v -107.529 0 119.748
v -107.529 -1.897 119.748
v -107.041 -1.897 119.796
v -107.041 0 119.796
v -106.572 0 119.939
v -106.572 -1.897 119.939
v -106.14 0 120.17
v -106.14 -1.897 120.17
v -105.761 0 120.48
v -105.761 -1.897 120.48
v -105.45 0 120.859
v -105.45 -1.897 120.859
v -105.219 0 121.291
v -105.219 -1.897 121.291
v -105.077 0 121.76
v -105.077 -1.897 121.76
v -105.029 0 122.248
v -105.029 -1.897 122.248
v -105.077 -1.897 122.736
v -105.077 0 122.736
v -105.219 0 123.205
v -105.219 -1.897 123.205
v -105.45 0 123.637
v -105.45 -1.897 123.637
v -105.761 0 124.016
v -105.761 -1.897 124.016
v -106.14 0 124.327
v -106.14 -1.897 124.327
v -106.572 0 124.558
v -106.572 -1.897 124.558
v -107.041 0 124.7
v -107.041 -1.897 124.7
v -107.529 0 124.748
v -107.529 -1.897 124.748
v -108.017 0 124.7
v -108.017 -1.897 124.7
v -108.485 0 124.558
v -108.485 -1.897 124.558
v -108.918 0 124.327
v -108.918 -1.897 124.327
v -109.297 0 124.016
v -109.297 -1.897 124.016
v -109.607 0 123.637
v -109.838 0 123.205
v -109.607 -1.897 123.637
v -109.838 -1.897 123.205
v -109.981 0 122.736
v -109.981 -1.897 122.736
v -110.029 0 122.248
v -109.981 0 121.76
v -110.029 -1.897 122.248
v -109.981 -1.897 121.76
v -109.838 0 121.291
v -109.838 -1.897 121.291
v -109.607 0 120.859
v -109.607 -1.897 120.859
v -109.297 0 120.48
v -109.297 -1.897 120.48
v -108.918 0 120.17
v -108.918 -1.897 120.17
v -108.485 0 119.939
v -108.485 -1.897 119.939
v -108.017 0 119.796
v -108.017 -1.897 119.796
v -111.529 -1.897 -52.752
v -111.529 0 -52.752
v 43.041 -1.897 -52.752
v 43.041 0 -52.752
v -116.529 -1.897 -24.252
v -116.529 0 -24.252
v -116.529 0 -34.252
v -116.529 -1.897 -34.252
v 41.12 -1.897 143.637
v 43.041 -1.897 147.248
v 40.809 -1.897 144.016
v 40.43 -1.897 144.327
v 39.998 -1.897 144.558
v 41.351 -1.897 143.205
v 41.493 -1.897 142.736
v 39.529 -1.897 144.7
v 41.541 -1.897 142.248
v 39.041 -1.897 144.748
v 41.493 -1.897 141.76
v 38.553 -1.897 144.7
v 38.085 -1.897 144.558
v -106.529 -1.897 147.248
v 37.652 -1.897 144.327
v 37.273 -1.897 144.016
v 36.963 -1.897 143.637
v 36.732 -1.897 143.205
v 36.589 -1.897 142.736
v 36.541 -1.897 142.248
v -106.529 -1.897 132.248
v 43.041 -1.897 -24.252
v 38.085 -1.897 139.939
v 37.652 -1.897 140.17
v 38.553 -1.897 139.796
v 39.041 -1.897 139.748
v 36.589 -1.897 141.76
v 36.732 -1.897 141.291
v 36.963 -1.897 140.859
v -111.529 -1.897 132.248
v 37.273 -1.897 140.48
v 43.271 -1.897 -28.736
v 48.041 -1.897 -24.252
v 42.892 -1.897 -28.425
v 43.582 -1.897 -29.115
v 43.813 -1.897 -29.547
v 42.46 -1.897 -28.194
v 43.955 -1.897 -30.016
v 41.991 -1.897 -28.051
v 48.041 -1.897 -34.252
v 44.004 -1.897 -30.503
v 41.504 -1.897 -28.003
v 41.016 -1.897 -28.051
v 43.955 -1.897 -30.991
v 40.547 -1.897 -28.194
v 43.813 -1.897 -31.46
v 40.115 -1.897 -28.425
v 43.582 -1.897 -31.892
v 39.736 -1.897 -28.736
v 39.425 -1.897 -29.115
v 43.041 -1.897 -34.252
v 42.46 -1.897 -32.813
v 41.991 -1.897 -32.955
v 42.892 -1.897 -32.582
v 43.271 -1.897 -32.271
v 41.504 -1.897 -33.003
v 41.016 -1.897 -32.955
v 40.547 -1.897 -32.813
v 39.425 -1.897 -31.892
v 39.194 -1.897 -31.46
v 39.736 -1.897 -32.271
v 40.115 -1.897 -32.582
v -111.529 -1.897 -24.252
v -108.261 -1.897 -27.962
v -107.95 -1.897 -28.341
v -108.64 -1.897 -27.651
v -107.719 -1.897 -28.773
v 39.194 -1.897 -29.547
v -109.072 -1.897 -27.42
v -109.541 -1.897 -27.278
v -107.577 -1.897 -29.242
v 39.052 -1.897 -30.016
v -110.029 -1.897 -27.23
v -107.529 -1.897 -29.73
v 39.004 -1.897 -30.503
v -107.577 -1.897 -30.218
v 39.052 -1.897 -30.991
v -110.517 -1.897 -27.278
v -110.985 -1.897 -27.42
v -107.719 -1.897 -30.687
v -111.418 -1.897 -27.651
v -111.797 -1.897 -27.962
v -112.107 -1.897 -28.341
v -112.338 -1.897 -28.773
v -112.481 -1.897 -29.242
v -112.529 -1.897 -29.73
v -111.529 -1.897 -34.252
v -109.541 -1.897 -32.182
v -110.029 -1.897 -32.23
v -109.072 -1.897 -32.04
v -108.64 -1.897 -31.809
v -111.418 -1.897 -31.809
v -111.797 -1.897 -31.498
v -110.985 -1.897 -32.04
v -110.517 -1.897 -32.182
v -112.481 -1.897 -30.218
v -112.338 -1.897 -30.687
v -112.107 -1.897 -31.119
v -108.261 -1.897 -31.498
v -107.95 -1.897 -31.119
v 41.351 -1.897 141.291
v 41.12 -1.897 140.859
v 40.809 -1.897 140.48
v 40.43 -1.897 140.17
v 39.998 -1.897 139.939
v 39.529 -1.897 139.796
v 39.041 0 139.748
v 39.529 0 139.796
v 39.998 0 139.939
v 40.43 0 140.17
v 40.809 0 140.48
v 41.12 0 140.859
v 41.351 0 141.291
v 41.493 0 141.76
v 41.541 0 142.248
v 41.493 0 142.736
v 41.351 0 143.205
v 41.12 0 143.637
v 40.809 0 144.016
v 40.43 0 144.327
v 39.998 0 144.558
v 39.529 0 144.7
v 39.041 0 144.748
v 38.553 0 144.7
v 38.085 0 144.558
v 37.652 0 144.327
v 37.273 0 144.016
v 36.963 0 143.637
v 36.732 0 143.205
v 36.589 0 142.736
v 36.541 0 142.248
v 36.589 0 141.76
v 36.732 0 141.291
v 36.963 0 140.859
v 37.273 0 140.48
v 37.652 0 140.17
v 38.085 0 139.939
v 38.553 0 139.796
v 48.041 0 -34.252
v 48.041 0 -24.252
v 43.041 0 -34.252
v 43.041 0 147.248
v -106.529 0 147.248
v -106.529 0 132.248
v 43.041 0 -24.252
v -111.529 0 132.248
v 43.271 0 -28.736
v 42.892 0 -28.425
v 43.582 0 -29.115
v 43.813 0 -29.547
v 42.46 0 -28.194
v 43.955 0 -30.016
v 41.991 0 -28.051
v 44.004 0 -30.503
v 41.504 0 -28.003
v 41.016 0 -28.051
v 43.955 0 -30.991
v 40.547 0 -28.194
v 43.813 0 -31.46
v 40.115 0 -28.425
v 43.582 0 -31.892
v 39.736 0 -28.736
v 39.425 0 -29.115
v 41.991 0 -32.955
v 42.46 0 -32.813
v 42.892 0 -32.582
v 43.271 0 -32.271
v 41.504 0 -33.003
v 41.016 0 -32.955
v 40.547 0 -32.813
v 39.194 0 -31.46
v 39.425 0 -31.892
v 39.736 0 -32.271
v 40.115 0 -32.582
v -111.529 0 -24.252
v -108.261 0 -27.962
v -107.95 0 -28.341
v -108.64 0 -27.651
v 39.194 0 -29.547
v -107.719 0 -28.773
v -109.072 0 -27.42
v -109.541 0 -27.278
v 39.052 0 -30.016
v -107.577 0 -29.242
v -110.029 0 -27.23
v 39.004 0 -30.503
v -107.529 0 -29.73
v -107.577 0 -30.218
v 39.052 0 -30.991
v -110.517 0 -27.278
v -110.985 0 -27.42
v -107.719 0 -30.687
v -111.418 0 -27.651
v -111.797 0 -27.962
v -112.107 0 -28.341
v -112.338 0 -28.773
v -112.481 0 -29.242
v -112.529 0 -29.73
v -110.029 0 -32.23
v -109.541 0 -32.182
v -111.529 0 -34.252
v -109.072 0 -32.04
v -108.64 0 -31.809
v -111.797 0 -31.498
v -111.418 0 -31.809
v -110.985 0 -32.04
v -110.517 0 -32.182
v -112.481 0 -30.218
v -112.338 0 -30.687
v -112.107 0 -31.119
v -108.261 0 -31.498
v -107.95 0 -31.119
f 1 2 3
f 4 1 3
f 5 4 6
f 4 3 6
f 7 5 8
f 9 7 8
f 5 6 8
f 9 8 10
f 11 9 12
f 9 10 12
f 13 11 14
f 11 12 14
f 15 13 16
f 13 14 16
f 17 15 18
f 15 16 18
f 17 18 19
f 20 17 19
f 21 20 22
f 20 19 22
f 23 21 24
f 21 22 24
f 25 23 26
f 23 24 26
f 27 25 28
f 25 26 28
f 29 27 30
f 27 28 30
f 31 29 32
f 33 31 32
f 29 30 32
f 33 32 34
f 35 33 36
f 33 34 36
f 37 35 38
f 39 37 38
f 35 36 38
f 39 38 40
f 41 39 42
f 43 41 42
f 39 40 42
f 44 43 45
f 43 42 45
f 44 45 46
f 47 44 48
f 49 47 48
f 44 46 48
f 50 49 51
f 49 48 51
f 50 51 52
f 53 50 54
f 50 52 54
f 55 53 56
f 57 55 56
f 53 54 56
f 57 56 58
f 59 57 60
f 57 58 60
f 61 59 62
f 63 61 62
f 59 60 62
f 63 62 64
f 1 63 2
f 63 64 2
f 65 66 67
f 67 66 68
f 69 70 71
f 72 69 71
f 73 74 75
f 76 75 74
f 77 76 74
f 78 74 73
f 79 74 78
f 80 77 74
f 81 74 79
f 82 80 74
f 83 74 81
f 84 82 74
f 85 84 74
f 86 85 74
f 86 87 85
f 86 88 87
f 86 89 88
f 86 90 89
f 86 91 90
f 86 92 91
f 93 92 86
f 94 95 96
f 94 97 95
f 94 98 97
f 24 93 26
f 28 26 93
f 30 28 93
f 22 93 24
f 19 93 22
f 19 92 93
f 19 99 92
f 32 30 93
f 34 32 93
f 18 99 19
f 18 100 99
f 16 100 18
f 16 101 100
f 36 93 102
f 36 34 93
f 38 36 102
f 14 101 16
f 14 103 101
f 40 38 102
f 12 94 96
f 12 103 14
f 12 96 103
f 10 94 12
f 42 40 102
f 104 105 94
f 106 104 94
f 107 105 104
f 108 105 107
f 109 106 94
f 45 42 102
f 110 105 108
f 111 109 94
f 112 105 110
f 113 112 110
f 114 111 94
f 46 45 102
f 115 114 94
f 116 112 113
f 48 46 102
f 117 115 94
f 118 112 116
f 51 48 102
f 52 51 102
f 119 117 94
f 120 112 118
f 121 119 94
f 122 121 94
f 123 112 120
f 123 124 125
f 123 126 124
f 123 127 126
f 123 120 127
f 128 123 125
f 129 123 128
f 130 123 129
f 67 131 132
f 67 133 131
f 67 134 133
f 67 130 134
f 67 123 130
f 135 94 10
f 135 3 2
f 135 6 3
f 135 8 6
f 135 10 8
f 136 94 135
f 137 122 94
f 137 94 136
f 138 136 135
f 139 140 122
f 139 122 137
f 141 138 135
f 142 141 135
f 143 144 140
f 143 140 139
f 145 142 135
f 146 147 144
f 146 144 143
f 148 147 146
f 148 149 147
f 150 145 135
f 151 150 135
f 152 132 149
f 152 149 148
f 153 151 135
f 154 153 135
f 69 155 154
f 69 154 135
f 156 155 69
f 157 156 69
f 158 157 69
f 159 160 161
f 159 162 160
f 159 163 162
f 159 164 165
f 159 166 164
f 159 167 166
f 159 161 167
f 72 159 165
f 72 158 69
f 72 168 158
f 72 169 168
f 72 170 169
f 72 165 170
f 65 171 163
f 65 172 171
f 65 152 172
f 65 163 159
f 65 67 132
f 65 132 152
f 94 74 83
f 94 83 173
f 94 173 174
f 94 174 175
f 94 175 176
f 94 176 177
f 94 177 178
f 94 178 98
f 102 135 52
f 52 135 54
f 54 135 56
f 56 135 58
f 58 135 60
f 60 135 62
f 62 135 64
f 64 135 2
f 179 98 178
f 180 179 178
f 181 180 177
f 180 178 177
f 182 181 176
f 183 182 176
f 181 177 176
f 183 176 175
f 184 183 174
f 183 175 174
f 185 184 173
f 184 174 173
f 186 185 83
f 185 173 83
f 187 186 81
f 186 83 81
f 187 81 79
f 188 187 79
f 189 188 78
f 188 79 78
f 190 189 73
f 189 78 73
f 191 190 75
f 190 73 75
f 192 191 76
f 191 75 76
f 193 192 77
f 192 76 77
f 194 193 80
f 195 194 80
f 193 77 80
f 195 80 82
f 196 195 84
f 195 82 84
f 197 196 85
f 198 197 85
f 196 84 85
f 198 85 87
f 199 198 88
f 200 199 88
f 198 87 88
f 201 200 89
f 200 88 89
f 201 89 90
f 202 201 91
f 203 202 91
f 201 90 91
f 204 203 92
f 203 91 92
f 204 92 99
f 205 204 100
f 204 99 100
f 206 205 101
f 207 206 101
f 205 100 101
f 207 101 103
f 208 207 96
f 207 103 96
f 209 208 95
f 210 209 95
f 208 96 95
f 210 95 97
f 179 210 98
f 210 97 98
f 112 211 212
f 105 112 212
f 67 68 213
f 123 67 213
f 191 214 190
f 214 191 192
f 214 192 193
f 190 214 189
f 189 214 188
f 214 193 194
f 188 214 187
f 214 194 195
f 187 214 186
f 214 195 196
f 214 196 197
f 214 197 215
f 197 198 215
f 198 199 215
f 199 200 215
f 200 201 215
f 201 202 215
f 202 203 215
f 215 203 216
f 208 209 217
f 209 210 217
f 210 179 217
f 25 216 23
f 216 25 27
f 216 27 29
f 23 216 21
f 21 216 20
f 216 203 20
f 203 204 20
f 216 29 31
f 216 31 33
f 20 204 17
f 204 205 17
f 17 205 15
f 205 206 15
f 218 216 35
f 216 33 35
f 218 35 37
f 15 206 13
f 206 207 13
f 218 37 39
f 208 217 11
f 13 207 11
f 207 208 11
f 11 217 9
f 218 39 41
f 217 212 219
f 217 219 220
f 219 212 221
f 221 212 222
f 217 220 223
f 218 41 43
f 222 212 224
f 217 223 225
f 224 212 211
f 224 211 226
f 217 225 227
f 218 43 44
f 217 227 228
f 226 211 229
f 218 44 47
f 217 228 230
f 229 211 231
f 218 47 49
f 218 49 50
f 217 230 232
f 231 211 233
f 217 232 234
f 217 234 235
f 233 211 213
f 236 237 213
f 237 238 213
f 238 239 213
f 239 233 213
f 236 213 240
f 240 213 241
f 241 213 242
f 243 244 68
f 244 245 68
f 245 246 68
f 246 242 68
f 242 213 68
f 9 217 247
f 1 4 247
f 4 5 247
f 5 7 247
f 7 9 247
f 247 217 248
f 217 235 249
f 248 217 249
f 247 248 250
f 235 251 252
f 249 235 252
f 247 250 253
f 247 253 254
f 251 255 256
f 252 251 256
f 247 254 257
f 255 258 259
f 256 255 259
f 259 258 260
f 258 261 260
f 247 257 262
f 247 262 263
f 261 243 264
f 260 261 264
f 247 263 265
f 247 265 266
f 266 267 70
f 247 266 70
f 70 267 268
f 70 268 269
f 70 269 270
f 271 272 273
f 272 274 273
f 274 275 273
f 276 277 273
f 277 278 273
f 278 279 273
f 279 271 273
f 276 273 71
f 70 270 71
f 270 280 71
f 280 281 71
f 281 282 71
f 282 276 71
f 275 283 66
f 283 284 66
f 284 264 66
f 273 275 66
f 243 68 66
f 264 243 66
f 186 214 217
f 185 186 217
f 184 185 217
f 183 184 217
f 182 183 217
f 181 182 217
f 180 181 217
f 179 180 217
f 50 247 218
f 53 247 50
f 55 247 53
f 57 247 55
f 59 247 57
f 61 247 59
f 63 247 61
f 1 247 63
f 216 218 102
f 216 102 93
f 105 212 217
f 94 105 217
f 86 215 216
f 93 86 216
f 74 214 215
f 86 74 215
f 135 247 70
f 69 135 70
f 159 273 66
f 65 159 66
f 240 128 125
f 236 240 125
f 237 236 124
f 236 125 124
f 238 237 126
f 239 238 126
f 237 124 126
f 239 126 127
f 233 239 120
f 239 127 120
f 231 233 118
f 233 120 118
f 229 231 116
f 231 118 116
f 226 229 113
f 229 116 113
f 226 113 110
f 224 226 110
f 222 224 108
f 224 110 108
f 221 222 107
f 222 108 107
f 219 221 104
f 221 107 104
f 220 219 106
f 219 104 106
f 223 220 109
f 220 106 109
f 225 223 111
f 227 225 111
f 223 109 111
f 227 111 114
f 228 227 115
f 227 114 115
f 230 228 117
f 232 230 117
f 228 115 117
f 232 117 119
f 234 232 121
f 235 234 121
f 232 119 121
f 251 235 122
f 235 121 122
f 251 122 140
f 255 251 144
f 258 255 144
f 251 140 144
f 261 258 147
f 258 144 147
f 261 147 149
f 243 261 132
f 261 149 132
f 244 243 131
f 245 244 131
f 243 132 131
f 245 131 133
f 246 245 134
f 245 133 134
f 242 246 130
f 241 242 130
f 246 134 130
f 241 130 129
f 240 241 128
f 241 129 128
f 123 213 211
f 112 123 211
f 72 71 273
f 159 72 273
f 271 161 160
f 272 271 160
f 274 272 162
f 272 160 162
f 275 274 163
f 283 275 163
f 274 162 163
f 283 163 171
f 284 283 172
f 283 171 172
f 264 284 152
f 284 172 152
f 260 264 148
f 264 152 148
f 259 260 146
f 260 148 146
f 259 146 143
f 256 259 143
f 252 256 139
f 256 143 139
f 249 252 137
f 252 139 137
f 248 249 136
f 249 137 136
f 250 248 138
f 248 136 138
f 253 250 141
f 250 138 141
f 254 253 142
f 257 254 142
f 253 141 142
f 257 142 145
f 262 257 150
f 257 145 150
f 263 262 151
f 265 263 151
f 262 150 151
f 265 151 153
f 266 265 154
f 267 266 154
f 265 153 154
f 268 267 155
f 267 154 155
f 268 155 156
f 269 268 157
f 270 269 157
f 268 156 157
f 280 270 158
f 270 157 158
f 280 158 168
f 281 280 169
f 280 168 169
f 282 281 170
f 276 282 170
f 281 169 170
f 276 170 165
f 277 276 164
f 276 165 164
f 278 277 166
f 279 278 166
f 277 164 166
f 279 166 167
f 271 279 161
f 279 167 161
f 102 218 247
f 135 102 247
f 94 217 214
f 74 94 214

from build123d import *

# Parameters (mm, degrees)
BASE_FLANGE1_DEPTH = 1.89738
SKETCH6_R          = 2.5
CUT_EXTRUDE1_DEPTH = 1.89738
SKETCH7_W          = 5
SKETCH7_H          = 15
CUT_EXTRUDE2_DEPTH = 10


# Sheet-metal steps are written as plain solids
with BuildPart() as part:
    # Sketch1 → Base-Flange1 (new body)
    with BuildSketch(Plane(origin=(0, 0, 0), x_dir=(1, 0, 0), z_dir=(0, 1, 0))):
        Polygon((43.041223022, 34.251798561), (48.041223022, 34.251798561), (48.041223022, 24.251798561), (43.041223022, 24.251798561), (43.041223022, -147.248201439), (-111.528776978, -147.248201439), (-111.528776978, 24.251798561), (-116.528776978, 24.251798561), (-116.528776978, 34.251798561), (-111.528776978, 34.251798561), (-111.528776978, 52.751798561), (43.041223022, 52.751798561), align=None)
    extrude(amount=-BASE_FLANGE1_DEPTH)

    # Sketch6 → Cut-Extrude1 (cut)
    with BuildSketch(Plane.XZ.offset(1.89738)):
        with Locations(Location((-107.528776978, 122.248201439, 0), (0, 0, 270))):
            Circle(SKETCH6_R)
        with Locations(Location((39.041223022, 142.248201439, 0), (0, 0, 270))):
            Circle(SKETCH6_R)
        with Locations(Location((-110.028776978, -29.729970338, 0), (0, 0, 270))):
            Circle(SKETCH6_R)
        with Locations(Location((41.503528065, -30.503445529, 0), (0, 0, 270))):
            Circle(SKETCH6_R)
    extrude(amount=-CUT_EXTRUDE1_DEPTH, mode=Mode.SUBTRACT)

    # Sketch7 → Cut-Extrude2 (cut)
    with BuildSketch(Plane(origin=(0, 0, 0), x_dir=(1, 0, 0), z_dir=(0, 1, 0))):
        with Locations((-109.028776978, -139.748201439)):
            Rectangle(SKETCH7_W, SKETCH7_H)
    extrude(amount=-CUT_EXTRUDE2_DEPTH, mode=Mode.SUBTRACT)


solid = part.part
